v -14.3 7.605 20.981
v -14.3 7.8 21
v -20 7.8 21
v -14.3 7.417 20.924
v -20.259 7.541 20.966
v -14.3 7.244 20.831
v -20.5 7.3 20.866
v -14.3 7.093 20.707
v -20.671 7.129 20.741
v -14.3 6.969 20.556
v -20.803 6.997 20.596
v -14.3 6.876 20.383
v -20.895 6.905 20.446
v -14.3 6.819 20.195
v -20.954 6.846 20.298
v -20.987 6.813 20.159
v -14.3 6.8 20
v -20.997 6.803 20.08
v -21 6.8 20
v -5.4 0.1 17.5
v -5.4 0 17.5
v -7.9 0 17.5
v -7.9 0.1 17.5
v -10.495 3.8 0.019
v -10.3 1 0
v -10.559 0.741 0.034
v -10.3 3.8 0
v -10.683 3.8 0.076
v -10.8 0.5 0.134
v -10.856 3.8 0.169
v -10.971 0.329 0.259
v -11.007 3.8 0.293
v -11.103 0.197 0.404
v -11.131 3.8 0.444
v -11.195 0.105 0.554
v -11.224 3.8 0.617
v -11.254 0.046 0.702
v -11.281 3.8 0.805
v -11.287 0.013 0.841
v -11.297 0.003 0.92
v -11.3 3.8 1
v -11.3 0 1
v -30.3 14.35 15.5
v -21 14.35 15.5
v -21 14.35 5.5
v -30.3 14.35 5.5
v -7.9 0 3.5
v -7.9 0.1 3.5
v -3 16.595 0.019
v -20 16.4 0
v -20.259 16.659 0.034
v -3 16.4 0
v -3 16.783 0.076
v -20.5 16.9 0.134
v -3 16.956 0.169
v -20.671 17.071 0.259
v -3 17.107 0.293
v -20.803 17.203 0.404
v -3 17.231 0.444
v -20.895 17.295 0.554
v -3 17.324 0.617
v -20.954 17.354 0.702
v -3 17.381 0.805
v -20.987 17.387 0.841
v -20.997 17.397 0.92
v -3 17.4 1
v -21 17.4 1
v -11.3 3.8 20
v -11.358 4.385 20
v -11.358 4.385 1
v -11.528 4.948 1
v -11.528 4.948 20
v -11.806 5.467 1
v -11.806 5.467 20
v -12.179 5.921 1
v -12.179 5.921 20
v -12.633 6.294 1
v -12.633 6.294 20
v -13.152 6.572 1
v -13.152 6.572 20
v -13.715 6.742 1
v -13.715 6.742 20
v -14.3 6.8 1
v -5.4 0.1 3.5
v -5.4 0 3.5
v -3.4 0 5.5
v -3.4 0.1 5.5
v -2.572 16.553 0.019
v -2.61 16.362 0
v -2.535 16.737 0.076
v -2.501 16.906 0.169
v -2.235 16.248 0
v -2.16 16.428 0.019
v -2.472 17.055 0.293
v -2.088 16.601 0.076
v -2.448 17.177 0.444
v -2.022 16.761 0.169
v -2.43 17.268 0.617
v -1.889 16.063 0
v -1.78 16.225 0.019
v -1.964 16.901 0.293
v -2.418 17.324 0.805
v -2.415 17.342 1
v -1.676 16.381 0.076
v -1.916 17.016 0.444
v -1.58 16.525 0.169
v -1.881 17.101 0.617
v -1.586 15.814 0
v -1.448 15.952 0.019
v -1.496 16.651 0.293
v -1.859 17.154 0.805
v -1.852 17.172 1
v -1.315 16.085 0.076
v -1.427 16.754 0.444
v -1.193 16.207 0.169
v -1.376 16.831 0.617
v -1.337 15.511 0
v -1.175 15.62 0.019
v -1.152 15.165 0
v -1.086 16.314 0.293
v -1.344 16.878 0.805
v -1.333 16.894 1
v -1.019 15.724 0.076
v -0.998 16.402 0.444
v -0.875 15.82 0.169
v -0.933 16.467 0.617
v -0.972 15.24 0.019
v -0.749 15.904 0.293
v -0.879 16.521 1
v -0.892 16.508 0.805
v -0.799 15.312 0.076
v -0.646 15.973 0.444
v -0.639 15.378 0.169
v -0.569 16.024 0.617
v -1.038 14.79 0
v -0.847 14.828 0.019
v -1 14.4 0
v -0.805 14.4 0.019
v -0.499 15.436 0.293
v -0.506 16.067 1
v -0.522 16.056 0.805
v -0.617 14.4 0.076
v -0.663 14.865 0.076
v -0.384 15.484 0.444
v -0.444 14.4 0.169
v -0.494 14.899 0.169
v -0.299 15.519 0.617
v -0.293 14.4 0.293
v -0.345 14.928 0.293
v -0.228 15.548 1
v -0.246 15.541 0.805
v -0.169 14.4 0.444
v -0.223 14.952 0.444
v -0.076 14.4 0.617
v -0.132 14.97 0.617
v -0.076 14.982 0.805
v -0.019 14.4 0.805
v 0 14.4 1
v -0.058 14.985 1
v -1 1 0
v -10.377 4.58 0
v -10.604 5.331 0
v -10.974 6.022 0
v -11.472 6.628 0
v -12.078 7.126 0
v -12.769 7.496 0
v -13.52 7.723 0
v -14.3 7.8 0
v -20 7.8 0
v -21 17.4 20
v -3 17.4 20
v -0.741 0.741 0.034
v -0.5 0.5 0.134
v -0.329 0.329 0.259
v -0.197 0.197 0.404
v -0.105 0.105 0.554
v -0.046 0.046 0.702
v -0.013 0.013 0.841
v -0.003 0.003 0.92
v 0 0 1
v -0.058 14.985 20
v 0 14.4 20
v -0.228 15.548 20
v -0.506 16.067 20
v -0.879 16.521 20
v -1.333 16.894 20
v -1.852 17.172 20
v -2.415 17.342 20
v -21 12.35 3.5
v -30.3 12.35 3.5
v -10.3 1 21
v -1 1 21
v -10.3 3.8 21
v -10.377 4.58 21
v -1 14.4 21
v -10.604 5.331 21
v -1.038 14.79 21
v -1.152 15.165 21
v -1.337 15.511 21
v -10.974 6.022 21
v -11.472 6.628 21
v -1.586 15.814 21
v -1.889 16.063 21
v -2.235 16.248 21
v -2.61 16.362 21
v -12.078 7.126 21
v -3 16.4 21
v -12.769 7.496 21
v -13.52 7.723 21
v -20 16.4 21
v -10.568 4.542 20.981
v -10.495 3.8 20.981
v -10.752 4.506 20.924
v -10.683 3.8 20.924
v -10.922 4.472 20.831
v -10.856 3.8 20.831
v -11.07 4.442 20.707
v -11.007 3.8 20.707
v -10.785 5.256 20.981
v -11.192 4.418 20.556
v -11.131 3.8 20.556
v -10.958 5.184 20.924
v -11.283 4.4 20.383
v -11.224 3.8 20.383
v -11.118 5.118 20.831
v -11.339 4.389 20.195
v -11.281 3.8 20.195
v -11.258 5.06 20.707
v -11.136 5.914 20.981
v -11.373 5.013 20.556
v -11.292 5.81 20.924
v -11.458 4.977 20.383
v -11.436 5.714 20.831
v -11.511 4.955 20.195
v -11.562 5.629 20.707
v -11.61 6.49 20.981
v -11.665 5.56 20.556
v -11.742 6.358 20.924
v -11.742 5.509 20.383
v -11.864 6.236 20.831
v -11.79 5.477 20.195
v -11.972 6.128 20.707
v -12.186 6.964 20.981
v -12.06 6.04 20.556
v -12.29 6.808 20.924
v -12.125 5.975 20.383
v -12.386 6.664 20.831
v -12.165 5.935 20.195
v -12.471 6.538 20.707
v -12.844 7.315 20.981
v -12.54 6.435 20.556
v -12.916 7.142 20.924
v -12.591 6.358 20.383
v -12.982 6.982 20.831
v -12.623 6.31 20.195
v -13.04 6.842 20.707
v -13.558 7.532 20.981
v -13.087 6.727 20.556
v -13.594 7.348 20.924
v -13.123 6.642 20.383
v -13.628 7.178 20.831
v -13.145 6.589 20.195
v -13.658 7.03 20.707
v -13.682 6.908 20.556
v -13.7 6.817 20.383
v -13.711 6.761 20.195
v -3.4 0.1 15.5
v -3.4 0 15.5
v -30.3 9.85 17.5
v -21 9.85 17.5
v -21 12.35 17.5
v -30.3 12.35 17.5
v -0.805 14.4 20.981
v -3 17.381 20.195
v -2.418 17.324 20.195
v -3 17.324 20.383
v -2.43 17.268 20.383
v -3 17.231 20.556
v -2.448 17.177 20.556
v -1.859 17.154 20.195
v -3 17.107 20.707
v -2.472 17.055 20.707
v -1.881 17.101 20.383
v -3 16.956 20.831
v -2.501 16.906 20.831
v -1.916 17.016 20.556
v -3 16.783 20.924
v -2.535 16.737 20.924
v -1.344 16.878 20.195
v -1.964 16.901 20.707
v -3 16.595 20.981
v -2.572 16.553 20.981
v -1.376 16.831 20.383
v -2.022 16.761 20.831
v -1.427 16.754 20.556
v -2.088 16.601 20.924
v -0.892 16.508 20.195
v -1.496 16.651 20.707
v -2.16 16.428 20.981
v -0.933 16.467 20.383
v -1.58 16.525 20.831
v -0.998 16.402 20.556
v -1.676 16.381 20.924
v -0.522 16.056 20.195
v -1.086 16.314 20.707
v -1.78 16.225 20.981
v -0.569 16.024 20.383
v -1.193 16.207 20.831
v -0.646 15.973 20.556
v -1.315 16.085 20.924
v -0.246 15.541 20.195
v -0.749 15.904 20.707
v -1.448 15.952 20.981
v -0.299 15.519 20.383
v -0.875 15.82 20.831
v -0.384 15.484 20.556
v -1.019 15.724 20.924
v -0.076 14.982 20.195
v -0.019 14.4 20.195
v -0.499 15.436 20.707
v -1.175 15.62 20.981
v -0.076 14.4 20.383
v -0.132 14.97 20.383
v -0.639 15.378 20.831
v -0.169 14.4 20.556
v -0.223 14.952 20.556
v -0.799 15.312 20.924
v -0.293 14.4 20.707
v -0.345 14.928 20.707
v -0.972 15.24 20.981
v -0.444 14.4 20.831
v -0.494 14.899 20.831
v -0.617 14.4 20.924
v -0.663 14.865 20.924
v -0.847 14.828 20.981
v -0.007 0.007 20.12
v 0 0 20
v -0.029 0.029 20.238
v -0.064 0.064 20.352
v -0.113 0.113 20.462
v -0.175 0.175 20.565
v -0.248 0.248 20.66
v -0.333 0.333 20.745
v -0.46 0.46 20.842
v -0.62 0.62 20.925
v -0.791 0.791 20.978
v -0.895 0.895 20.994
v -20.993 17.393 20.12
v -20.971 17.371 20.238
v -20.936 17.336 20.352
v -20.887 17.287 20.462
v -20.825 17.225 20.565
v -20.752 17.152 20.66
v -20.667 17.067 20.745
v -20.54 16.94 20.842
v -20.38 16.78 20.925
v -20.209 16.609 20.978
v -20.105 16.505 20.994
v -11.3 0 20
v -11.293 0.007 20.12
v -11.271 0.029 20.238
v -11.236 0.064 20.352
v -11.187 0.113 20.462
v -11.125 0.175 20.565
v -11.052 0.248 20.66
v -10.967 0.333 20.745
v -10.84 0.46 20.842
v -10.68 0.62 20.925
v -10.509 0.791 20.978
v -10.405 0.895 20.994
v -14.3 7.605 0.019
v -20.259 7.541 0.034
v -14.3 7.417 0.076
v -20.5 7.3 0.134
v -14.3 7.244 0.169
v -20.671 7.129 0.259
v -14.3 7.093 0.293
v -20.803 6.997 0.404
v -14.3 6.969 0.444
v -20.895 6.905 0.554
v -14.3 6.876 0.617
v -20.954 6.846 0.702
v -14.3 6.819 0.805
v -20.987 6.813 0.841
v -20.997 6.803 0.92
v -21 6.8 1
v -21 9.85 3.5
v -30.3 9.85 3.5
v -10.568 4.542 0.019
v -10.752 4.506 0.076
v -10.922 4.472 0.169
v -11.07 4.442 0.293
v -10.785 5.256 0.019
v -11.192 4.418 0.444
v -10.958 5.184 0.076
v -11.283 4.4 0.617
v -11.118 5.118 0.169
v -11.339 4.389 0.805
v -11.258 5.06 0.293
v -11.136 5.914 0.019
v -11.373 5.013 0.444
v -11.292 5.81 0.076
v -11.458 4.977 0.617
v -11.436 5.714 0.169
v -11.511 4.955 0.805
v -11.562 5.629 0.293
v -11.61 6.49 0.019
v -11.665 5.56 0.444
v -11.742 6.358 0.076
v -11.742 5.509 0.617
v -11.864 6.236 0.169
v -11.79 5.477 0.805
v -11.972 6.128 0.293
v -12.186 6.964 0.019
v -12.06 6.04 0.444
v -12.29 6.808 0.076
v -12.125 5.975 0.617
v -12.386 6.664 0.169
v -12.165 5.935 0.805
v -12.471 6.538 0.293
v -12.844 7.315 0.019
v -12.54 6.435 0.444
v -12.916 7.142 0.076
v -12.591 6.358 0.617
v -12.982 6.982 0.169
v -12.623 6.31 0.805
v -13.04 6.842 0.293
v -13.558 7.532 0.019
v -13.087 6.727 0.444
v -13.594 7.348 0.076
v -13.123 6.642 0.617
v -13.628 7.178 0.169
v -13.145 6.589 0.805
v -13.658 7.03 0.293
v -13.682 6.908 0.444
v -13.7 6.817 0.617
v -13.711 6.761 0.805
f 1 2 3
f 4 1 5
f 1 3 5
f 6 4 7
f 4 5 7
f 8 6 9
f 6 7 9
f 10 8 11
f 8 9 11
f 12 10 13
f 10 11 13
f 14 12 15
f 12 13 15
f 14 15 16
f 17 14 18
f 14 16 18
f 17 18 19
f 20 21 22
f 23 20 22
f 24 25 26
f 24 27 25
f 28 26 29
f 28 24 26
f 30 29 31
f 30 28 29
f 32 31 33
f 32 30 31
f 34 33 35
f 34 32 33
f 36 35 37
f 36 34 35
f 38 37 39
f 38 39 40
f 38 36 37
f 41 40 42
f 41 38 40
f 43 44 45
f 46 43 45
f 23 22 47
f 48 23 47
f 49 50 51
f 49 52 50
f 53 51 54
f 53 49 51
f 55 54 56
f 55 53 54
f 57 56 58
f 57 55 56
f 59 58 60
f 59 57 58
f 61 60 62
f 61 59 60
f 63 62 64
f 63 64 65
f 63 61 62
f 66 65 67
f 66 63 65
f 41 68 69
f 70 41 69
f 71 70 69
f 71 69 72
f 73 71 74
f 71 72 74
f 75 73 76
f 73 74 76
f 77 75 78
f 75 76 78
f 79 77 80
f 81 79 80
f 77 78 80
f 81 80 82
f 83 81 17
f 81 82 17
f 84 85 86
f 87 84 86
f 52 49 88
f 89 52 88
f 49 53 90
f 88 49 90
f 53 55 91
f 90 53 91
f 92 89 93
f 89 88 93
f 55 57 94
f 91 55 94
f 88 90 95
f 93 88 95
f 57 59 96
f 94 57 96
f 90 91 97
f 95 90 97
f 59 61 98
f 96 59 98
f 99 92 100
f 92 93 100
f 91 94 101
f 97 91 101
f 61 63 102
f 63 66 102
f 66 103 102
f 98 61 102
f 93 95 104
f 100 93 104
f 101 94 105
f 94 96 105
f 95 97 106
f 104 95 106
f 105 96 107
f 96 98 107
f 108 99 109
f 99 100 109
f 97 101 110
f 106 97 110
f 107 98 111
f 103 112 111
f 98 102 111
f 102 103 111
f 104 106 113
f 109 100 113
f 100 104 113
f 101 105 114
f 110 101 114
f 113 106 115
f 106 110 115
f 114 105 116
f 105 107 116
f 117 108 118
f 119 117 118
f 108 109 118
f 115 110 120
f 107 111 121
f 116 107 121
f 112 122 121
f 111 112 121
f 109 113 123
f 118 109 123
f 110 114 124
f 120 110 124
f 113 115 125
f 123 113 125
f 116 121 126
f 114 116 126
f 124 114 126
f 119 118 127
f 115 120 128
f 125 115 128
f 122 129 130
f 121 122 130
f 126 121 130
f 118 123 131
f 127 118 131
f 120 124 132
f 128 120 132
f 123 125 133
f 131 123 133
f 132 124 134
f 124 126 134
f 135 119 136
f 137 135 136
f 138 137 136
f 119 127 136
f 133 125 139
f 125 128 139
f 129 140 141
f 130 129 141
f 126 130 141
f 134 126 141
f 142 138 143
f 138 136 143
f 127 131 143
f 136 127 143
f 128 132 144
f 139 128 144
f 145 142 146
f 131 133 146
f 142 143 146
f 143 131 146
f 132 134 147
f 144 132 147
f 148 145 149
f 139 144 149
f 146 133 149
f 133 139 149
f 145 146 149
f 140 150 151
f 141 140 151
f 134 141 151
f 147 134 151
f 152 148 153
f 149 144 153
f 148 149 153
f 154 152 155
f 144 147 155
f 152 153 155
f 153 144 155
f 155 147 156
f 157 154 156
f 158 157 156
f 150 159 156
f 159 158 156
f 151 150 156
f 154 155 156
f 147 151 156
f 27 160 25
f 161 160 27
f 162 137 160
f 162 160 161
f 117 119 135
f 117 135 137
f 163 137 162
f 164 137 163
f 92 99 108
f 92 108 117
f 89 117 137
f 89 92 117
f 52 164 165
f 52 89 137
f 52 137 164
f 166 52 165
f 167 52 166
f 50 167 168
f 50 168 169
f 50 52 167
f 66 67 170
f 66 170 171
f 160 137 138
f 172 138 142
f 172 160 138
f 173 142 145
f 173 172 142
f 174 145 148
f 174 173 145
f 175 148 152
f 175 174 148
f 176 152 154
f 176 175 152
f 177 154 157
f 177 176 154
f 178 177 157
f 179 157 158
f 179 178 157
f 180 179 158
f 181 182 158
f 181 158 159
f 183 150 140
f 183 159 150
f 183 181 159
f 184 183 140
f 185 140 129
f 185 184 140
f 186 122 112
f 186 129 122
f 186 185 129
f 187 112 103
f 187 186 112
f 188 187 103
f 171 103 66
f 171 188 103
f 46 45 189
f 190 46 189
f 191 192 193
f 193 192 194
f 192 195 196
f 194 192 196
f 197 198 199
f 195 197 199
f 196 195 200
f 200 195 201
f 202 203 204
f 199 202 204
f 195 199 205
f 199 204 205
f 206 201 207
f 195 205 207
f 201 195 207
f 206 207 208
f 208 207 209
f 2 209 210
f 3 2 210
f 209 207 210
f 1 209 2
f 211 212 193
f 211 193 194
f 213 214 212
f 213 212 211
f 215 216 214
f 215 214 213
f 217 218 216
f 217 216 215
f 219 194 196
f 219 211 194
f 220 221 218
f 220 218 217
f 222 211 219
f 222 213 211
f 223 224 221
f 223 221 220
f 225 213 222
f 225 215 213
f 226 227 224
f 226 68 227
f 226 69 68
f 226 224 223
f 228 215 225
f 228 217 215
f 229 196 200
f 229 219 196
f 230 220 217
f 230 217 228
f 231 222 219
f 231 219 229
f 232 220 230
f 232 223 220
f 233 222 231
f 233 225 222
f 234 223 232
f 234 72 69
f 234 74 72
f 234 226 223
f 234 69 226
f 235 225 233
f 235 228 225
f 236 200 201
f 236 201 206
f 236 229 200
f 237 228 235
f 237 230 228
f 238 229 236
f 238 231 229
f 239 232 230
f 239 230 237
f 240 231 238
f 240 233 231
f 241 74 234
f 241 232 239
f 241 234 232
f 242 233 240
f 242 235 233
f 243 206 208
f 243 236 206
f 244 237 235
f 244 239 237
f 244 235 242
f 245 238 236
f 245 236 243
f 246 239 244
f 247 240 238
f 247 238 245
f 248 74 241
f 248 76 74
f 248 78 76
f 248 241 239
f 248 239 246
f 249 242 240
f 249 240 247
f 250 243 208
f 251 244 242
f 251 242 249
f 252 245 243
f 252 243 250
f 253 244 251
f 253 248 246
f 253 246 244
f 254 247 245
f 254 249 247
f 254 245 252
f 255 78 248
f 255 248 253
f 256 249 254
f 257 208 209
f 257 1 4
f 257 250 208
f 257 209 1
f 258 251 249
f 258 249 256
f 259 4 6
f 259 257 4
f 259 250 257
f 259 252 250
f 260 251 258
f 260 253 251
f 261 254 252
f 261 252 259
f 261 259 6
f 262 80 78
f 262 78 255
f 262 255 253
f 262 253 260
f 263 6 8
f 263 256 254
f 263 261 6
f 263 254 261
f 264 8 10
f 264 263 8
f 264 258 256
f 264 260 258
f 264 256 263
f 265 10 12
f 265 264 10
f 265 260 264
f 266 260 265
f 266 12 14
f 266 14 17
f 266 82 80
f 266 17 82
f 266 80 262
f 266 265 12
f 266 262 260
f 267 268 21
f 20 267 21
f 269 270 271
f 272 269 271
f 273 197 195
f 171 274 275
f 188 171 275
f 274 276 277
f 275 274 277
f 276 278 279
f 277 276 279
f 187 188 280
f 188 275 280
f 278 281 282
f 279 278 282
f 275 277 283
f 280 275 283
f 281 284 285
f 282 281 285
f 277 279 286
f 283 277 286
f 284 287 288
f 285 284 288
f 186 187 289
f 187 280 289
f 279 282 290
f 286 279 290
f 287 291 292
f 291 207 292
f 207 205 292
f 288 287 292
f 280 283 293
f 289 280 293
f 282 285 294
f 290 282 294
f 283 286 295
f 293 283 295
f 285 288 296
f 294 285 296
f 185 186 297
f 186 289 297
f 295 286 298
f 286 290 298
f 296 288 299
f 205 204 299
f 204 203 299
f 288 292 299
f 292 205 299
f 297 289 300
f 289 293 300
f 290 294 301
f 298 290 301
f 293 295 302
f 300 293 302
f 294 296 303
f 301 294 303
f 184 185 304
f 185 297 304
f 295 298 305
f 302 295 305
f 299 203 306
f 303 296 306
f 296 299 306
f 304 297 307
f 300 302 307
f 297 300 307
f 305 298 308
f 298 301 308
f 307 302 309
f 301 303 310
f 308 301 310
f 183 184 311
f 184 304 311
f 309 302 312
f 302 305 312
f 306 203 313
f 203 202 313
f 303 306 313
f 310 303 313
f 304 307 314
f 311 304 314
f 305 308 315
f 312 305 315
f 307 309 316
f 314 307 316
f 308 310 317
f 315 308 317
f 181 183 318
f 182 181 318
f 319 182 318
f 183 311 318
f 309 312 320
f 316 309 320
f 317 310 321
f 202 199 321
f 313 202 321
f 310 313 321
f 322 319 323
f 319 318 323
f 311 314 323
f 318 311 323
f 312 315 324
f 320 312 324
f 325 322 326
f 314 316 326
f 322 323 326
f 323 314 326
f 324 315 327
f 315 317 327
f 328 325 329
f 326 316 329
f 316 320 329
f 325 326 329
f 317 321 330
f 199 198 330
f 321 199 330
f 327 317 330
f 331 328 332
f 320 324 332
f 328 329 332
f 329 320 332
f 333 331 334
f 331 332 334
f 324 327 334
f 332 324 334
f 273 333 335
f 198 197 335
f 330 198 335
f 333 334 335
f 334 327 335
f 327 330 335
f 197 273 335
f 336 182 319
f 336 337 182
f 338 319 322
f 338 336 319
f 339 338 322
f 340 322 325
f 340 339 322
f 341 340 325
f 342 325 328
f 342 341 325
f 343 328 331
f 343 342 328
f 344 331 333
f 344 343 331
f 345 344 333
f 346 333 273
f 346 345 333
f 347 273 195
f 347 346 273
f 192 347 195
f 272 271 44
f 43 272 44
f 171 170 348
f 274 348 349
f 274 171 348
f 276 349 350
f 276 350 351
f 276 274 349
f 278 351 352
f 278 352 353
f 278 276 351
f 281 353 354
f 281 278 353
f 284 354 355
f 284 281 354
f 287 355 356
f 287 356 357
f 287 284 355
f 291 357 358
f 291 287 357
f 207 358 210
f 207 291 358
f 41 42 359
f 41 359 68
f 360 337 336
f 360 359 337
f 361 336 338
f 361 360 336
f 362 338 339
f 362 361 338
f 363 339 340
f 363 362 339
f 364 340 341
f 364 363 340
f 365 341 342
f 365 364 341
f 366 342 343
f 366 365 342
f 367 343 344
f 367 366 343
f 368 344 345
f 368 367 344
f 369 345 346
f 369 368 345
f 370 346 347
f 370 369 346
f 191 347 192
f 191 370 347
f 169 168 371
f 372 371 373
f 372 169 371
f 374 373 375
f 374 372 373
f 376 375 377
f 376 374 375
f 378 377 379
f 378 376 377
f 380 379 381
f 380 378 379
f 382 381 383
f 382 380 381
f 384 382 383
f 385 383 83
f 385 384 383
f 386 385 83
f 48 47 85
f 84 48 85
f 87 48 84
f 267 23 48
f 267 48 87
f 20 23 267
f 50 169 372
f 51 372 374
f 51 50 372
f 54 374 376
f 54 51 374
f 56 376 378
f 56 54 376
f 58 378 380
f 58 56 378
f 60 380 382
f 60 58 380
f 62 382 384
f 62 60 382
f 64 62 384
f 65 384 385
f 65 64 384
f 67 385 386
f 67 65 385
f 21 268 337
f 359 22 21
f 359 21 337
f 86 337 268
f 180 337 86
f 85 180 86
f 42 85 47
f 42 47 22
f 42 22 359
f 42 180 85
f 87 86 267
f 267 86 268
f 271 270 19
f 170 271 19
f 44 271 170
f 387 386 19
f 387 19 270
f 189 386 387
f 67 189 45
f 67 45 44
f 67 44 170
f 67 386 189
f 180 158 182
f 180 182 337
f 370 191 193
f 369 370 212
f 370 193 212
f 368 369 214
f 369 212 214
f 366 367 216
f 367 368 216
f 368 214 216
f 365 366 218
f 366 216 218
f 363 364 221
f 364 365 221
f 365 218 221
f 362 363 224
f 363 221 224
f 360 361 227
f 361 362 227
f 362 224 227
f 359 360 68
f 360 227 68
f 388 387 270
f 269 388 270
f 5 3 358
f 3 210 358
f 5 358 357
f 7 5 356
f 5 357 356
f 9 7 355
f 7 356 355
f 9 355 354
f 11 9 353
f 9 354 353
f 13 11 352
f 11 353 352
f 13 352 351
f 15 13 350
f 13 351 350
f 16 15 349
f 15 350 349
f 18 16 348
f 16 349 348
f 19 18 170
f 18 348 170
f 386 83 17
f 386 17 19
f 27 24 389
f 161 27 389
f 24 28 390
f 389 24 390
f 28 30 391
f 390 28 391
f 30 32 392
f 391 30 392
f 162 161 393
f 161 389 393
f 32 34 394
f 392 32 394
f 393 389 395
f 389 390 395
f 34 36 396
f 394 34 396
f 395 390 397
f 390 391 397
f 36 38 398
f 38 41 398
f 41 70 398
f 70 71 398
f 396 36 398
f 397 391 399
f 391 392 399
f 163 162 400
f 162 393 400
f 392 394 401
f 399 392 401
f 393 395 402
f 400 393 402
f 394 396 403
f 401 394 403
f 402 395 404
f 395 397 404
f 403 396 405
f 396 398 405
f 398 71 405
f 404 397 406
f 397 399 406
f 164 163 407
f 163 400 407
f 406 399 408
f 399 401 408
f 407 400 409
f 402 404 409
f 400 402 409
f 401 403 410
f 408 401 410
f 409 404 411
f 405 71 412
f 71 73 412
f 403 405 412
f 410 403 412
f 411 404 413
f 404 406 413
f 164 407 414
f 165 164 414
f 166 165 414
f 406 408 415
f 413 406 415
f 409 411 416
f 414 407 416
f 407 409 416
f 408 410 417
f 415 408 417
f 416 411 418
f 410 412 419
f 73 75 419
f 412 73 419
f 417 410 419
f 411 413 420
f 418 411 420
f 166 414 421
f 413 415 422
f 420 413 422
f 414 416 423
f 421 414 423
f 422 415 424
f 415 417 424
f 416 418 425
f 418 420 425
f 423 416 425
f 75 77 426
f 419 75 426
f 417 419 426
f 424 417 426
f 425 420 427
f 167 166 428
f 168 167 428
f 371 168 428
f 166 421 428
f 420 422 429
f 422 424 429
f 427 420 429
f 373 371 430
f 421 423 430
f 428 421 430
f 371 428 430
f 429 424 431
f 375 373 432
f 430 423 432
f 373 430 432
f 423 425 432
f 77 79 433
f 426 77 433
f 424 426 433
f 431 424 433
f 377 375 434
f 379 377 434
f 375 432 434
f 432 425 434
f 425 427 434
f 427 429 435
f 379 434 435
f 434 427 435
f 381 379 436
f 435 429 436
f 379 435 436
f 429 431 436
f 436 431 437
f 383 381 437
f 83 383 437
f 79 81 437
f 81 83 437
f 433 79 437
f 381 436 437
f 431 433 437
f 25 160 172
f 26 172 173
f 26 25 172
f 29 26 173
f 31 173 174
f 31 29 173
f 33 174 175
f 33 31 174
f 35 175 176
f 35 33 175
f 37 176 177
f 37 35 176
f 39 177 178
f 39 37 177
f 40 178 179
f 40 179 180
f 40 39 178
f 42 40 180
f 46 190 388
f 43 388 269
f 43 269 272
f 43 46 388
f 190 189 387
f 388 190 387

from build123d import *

# Parameters (mm, degrees)
EXTRUDE_1_DEPTH     = 21
EXTRUDE_2_DEPTH     = 9.3
CUT_EXTRUDE_1_DEPTH = 0.1
FILLET_1_R          = 3
FILLET_2_R          = 1


with BuildPart() as part:
    # 草图1 → 凸台-拉伸1 (new body)
    with BuildSketch(Plane.XY):
        Polygon((0, 17.4), (0, 0), (-11.3, 0), (-11.3, 6.8), (-21, 6.8), (-21, 17.4), align=None)
    extrude(amount=EXTRUDE_1_DEPTH)

    # 草图2 → 凸台-拉伸2 (add)
    with BuildSketch(Plane.ZY.offset(21)):
        Polygon((5.5, 14.35), (3.5, 12.35), (3.5, 9.85), (17.5, 9.85), (17.5, 12.35), (15.5, 14.35), align=None)
    extrude(amount=EXTRUDE_2_DEPTH)

    # 草图3 → 切除-拉伸1 (cut)
    with BuildSketch(Plane.XZ):
        Polygon((-7.9, 3.5), (-5.4, 3.5), (-3.4, 5.5), (-3.4, 15.5), (-5.4, 17.5), (-7.9, 17.5), align=None)
    extrude(amount=-CUT_EXTRUDE_1_DEPTH, mode=Mode.SUBTRACT)

    # 圆角1
    fillet_1_edges = [part.edges().sort_by_distance(p)[0] for p in [
        (0, 17.4, 10.5),
        (-11.3, 6.8, 10.5),
    ]]
    fillet(fillet_1_edges, radius=FILLET_1_R)

    # 圆角2
    fillet_2_edges = [part.edges().sort_by_distance(p)[0] for p in [
        (-5.65, 0, 21),
        (0, 7.2, 21),
        (-21, 12.1, 21),
        (-11.3, 1.9, 0),
        (-11.3, 1.9, 21),
        (-12, 17.4, 0),
        (-12, 17.4, 21),
        (-0.878679656, 16.521320344, 0),
        (-0.878679656, 16.521320344, 21),
        (-12.178679656, 5.921320344, 0),
        (-12.178679656, 5.921320344, 21),
        (0, 7.2, 0),
        (-5.65, 0, 0),
        (-17.65, 6.8, 21),
        (-17.65, 6.8, 0),
        (-21, 12.1, 0),
    ]]
    fillet(fillet_2_edges, radius=FILLET_2_R)


solid = part.part
